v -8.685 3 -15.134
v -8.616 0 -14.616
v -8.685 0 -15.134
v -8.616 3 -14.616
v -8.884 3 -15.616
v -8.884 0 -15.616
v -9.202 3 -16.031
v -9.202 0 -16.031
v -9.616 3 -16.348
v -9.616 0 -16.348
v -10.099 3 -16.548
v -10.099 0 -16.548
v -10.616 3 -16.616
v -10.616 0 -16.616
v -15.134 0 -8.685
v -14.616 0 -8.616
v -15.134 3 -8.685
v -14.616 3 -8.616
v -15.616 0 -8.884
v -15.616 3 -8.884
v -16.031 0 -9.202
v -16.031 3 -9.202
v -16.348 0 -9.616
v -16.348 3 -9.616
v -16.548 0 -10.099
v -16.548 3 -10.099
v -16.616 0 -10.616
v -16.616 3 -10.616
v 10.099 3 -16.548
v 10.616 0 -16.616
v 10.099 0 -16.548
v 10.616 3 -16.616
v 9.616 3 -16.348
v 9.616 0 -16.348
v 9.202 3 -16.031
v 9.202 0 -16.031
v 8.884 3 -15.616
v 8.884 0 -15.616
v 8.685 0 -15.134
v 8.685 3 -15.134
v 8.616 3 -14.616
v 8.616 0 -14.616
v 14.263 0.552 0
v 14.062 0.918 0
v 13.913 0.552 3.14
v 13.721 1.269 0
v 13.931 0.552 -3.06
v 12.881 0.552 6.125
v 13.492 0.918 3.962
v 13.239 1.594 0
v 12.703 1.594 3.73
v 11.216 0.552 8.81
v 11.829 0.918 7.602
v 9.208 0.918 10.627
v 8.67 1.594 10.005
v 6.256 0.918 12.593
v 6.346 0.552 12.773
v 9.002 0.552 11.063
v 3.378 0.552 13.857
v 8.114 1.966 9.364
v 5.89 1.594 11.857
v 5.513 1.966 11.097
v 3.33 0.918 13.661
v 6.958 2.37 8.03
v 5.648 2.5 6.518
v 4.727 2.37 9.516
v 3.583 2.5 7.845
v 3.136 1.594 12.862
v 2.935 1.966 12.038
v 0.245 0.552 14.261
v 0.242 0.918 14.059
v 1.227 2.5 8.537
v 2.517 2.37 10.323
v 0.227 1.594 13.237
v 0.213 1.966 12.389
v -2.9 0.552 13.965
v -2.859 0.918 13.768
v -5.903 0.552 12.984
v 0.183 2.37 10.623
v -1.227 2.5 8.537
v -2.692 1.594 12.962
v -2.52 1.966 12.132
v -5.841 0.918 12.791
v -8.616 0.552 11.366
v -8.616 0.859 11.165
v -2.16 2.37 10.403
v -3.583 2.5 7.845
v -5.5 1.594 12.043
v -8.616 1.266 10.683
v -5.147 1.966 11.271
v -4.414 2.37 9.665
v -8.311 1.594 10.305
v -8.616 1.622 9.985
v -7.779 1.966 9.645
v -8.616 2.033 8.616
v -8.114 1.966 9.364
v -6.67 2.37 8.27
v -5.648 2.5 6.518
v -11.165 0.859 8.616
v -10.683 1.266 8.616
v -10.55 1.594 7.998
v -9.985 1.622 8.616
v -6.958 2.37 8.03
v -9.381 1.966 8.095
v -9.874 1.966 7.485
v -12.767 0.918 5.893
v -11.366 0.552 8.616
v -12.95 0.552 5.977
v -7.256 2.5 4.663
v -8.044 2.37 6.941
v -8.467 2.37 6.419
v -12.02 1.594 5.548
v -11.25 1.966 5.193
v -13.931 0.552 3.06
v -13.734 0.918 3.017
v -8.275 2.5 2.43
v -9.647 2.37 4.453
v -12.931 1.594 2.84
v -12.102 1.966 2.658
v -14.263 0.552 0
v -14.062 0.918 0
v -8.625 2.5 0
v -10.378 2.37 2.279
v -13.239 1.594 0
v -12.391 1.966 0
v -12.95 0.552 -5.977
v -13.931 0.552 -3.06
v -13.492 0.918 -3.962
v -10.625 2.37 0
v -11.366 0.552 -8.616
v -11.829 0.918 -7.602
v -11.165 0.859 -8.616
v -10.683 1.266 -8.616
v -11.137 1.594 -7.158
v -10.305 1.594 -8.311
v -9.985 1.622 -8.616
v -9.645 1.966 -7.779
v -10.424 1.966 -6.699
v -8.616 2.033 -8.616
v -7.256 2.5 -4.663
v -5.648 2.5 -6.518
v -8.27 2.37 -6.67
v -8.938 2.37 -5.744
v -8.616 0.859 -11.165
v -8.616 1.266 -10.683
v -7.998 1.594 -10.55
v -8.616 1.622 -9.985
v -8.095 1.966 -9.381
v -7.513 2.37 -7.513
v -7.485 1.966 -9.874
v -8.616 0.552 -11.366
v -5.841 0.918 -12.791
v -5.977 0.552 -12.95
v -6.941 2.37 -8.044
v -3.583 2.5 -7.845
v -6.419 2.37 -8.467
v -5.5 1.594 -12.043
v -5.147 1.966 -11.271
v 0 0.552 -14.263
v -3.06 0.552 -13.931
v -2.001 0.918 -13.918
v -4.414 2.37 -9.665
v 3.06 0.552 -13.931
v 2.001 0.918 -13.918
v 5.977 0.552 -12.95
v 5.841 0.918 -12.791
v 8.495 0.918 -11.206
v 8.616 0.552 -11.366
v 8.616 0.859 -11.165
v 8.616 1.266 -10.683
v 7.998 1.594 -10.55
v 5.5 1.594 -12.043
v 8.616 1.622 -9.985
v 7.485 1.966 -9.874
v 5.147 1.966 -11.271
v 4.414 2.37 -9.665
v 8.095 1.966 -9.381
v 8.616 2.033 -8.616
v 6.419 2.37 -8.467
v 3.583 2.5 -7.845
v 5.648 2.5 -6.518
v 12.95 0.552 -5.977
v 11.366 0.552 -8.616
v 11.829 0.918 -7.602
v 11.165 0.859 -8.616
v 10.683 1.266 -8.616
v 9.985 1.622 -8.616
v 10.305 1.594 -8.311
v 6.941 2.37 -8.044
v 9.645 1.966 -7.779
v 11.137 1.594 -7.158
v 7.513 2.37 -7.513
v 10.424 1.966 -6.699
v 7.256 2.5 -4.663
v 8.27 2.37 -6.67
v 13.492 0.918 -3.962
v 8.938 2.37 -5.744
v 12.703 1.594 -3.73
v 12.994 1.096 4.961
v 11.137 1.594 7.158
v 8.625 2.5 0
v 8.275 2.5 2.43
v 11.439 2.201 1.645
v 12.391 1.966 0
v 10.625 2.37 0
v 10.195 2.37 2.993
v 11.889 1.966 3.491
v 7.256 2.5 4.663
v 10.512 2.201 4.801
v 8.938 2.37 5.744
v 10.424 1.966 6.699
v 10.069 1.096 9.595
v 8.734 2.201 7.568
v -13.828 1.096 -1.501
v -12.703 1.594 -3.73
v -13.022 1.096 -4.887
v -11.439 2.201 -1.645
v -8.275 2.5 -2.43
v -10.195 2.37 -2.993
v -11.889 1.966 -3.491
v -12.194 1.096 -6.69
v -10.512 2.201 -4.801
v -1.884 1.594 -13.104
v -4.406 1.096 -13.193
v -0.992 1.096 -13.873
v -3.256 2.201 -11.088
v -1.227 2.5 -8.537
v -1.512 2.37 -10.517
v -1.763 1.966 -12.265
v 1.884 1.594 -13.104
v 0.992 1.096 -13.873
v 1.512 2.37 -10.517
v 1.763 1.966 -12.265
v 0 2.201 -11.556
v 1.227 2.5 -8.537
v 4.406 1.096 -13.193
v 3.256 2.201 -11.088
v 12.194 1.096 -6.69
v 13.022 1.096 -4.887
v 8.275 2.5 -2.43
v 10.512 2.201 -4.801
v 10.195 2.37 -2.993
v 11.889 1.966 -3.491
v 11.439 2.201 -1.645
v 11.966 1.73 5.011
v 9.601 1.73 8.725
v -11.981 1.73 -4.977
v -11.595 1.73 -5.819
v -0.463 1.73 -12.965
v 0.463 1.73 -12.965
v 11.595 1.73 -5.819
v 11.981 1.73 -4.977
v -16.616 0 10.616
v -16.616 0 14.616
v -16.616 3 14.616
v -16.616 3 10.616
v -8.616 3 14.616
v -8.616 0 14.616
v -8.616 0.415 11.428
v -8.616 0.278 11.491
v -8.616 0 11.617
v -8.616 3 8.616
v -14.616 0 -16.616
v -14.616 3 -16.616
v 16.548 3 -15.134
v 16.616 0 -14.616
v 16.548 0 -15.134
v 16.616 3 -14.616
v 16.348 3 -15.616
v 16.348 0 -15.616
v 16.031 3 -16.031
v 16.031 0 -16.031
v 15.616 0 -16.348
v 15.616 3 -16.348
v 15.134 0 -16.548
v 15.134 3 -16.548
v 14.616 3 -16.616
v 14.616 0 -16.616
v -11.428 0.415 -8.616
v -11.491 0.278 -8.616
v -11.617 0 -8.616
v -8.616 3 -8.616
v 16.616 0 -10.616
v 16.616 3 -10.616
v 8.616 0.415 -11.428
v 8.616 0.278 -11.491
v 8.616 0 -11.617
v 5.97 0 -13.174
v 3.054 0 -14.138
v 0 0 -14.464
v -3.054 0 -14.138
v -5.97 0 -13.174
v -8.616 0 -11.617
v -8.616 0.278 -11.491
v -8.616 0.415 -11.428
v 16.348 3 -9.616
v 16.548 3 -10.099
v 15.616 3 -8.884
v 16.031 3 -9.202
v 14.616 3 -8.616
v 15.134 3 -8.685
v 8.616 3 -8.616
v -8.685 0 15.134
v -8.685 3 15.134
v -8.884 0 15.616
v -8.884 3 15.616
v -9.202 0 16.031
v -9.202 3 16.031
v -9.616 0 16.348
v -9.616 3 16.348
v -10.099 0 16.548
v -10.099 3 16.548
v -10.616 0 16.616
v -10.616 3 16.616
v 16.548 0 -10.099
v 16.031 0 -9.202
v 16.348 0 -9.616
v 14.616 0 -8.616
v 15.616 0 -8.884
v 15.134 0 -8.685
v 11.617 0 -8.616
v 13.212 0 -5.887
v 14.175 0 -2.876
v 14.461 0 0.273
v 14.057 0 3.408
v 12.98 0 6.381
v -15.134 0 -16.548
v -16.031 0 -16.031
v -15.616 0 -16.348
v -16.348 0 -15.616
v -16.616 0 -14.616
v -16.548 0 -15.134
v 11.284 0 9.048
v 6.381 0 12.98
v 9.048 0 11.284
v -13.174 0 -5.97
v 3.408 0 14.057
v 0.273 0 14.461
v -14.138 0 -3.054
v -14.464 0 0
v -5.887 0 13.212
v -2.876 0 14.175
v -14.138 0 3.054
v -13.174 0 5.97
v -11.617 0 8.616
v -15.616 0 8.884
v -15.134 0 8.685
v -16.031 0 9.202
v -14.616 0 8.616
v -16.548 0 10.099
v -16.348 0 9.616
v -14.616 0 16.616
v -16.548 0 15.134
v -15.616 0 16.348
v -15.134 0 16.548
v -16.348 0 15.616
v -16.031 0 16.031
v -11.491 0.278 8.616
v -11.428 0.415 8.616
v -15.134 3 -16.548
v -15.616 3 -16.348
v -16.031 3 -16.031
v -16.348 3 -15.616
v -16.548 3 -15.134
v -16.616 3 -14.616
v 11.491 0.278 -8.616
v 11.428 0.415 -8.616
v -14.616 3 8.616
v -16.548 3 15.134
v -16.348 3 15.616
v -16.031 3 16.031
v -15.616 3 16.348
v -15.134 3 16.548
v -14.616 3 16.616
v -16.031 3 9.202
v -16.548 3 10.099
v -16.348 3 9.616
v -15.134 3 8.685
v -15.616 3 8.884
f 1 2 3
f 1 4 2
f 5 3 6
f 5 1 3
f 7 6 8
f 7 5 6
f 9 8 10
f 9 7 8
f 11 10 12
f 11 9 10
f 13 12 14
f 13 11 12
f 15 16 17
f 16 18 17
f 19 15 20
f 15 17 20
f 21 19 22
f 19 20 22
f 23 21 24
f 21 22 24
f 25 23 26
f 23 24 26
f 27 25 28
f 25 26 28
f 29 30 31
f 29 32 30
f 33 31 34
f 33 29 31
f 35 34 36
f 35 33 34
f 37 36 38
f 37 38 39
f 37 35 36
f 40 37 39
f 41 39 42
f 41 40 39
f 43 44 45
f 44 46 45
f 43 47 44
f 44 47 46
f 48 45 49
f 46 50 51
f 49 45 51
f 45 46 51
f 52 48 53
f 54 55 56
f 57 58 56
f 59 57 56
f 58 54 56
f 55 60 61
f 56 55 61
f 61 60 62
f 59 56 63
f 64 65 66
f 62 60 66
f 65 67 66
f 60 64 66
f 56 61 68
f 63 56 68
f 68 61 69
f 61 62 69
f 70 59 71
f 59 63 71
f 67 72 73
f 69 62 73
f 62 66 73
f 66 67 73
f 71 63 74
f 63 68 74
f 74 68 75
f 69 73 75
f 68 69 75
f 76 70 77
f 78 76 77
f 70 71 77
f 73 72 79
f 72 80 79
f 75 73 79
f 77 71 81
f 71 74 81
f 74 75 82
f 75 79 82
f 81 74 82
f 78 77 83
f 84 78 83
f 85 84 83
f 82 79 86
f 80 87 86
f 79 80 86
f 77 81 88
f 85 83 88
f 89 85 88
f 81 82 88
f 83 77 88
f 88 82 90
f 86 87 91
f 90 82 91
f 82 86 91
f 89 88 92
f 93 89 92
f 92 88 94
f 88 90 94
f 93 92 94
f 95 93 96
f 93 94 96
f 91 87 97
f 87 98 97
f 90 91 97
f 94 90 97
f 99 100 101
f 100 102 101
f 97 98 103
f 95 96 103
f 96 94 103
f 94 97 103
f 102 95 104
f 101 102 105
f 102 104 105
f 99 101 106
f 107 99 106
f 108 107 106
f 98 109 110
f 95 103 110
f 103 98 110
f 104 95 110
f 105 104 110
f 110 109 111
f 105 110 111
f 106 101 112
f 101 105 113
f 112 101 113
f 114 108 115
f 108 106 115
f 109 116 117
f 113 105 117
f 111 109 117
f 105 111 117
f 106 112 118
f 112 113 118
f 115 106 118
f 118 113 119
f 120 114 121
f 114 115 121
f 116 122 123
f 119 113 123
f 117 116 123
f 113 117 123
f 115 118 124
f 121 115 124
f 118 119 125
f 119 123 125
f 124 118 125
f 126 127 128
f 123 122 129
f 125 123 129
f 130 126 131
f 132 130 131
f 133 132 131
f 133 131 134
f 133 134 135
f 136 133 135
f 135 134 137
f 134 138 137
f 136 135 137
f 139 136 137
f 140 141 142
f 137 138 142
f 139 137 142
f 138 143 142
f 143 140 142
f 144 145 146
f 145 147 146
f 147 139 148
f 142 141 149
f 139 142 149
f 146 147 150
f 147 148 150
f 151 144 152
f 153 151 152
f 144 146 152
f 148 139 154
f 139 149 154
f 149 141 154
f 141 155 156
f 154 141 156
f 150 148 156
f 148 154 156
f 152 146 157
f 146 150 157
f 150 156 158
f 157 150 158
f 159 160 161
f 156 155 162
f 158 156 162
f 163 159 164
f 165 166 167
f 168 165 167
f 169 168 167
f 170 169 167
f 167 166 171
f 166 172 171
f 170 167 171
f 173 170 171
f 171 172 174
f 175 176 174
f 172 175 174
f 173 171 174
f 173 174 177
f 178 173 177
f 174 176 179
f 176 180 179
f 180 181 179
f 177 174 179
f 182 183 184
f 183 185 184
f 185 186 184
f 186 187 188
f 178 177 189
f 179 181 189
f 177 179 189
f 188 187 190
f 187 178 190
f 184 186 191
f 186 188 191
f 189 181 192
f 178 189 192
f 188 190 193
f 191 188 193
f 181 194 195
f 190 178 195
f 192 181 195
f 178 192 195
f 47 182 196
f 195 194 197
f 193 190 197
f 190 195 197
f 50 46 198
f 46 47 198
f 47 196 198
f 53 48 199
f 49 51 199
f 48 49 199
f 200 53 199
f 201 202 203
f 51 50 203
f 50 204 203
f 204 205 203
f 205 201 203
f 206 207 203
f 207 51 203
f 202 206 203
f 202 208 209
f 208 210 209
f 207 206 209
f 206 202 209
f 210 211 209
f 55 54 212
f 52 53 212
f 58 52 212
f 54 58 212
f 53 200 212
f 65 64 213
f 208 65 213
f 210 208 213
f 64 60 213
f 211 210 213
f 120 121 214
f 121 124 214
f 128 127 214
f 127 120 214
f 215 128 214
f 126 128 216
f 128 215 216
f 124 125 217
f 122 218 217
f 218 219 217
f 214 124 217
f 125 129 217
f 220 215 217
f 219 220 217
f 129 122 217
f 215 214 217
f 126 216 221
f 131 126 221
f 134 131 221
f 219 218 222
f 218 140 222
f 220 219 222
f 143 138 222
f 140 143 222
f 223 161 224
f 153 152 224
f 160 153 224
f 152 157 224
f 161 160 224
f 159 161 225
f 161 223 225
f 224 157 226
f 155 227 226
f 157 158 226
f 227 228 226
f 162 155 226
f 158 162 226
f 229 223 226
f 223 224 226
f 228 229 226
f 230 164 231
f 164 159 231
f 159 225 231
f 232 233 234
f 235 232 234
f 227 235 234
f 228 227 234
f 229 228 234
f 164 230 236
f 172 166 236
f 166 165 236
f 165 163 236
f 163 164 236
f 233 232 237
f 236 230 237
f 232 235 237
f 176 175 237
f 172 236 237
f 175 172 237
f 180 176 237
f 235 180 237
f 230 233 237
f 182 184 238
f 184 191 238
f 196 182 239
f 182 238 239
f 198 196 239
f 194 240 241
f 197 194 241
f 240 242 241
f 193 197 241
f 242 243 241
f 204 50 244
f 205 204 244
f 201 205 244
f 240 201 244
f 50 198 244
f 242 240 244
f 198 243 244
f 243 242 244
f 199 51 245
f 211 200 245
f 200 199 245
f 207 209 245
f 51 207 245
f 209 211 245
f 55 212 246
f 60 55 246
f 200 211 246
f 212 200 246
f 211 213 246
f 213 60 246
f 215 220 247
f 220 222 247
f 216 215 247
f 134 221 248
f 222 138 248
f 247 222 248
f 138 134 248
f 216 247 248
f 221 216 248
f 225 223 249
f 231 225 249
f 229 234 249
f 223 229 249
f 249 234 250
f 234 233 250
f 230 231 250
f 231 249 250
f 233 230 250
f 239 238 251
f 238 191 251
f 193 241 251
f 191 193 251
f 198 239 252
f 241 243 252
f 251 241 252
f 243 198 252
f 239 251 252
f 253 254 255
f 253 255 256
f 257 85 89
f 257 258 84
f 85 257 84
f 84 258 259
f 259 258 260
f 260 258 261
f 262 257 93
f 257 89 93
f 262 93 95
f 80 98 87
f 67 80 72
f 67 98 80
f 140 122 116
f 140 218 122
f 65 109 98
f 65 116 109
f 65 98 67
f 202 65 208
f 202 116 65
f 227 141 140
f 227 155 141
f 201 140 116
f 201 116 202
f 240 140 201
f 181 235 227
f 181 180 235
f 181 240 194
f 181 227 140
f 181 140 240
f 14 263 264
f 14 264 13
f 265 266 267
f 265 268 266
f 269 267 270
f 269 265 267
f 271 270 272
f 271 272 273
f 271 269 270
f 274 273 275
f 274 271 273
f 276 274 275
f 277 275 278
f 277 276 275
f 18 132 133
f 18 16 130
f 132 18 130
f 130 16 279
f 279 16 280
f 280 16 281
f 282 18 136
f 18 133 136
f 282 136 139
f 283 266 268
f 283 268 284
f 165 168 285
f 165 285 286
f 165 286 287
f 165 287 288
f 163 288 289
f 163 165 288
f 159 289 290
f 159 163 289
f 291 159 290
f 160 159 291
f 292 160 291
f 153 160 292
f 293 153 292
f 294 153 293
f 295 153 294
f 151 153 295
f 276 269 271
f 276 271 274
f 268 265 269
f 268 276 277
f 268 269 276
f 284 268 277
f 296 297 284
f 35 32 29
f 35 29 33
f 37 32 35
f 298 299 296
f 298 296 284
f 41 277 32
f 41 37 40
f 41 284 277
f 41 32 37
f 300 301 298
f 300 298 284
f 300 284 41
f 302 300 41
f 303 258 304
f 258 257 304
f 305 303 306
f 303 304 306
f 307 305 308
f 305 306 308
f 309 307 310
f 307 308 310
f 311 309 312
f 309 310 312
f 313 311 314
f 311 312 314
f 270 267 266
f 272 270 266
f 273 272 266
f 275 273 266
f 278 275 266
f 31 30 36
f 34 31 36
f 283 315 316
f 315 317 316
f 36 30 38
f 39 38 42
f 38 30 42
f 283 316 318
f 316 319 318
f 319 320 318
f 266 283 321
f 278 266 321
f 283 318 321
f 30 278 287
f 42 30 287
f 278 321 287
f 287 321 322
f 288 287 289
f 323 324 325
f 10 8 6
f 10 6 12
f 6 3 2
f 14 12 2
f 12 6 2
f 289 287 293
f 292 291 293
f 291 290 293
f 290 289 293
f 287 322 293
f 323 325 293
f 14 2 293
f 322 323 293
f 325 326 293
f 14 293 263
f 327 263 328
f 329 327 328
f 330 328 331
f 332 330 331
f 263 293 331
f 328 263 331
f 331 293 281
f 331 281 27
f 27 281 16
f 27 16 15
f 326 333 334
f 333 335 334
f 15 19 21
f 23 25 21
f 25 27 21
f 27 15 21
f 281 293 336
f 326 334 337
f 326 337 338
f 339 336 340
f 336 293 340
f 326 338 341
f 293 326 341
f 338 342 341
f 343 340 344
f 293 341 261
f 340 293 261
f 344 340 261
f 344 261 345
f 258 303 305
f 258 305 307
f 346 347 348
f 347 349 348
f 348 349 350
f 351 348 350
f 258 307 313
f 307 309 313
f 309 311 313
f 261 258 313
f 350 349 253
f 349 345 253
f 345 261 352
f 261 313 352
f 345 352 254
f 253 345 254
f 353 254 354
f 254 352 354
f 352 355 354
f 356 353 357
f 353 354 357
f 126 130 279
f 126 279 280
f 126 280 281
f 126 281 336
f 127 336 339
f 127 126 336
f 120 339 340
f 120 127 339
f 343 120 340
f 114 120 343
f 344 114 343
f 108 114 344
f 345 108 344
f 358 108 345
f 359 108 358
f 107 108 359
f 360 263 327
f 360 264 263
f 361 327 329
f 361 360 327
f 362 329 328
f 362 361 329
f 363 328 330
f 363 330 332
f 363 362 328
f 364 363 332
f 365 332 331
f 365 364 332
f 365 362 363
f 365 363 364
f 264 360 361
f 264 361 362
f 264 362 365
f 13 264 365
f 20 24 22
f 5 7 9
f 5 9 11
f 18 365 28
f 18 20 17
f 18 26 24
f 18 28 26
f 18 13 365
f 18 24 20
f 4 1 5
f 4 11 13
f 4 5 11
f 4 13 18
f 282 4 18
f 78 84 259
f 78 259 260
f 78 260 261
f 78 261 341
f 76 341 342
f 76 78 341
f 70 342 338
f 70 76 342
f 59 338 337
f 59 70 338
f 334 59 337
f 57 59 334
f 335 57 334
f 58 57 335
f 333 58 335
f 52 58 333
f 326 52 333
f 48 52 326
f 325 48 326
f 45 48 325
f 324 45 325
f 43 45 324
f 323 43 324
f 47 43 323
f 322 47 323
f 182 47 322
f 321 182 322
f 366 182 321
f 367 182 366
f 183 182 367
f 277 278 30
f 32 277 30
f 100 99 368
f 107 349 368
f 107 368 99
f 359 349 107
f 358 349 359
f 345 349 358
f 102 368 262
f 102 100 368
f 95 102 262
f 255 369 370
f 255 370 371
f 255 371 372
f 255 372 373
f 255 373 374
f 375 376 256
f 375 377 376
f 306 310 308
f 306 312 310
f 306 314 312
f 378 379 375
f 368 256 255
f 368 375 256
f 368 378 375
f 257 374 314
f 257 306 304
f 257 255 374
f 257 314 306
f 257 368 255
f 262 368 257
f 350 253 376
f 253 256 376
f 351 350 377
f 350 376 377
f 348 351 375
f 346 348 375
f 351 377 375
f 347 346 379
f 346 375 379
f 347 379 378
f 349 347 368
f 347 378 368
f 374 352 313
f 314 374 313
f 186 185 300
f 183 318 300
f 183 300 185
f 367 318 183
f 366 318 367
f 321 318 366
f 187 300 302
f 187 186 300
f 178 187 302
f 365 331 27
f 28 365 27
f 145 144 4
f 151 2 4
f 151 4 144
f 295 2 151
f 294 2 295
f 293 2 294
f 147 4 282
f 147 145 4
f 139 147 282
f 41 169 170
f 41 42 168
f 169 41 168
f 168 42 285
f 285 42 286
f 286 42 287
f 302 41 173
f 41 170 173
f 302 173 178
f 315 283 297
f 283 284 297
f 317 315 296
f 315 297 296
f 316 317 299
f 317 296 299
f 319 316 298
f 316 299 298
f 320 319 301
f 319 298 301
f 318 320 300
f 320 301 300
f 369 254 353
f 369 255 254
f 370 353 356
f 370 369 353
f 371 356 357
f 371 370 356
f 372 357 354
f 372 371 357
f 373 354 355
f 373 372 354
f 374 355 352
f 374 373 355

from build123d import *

# Parameters (mm, degrees)
SKETCH2_R                = 14.463803576
BOSS_EXTRUDE1_DEPTH      = 2.5
BOSS_EXTRUDE1_TAPER      = 20
SKETCH4_W                = 8
SKETCH4_H                = 8
BOSS_EXTRUDE2_DEPTH      = 3
FILLET2_R                = 2
CIRPATTERN1_COUNT        = 4
FILLET2_OF_CIRPATTERN1_R = 2


with BuildPart() as part:
    # Sketch2 → Boss-Extrude1 (new body)
    with BuildSketch(Plane(origin=(0, 0, 0), x_dir=(1, 0, 0), z_dir=(0, 1, 0))):
        Circle(SKETCH2_R)
    extrude(amount=BOSS_EXTRUDE1_DEPTH, taper=BOSS_EXTRUDE1_TAPER)

    # Fillet1
    # an asymmetric fillet: 6, 4 mm, written as the material it takes off along each edge
    with BuildSketch(Plane(origin=(0, 2.5, 0), x_dir=(1, 0, 0), z_dir=(0, 0, -1))) as fillet1_piece_1:
        with BuildLine():
            Bezier((14.262848017, 1.94787914), (13.55387799, 0), (8.624692292, 0), weights=[1, 0.819152044, 1])
            Line((8.624692292, 0), (13.55387799, 0))
            Line((13.55387799, 0), (14.262848017, 1.94787914))
        make_face()
    revolve(axis=Axis((0, 2.5, 0), (0, -1, 0)), mode=Mode.SUBTRACT)

    # Sketch4 → Boss-Extrude2 (add)
    with BuildSketch(Plane(origin=(0, 0, 0), x_dir=(1, 0, 0), z_dir=(0, 1, 0))):
        with Locations((-12.616427752, -12.616427752)):
            Rectangle(SKETCH4_W, SKETCH4_H)
    boss_extrude2 = extrude(amount=BOSS_EXTRUDE2_DEPTH)

    # Fillet2
    fillet2_edges = [part.edges().sort_by_distance(p)[0] for p in [
        (-8.616427752, 1.5, 16.616427752),
        (-16.616427752, 1.5, 8.616427752),
        (-16.616427752, 1.5, 16.616427752),
    ]]
    fillet(fillet2_edges, radius=FILLET2_R)

    # CirPattern1: Boss-Extrude2 ×4 about axis, 1 skipped
    cirpattern1_axis = Axis((0, 0, 0), (0, 1, 0))
    add([boss_extrude2.rotate(cirpattern1_axis, i * 360 / CIRPATTERN1_COUNT) for i in range(1, CIRPATTERN1_COUNT) if i not in (1,)])

    # Fillet2 of CirPattern1
    fillet2_of_cirpattern1_edges = [part.edges().sort_by_distance(p)[0] for p in [
        (8.616427752, 1.5, -16.616427752),
        (16.616427752, 1.5, -8.616427752),
        (16.616427752, 1.5, -16.616427752),
        (-16.616427752, 1.5, -8.616427752),
        (-8.616427752, 1.5, -16.616427752),
        (-16.616427752, 1.5, -16.616427752),
    ]]
    fillet(fillet2_of_cirpattern1_edges, radius=FILLET2_OF_CIRPATTERN1_R)


solid = part.part
